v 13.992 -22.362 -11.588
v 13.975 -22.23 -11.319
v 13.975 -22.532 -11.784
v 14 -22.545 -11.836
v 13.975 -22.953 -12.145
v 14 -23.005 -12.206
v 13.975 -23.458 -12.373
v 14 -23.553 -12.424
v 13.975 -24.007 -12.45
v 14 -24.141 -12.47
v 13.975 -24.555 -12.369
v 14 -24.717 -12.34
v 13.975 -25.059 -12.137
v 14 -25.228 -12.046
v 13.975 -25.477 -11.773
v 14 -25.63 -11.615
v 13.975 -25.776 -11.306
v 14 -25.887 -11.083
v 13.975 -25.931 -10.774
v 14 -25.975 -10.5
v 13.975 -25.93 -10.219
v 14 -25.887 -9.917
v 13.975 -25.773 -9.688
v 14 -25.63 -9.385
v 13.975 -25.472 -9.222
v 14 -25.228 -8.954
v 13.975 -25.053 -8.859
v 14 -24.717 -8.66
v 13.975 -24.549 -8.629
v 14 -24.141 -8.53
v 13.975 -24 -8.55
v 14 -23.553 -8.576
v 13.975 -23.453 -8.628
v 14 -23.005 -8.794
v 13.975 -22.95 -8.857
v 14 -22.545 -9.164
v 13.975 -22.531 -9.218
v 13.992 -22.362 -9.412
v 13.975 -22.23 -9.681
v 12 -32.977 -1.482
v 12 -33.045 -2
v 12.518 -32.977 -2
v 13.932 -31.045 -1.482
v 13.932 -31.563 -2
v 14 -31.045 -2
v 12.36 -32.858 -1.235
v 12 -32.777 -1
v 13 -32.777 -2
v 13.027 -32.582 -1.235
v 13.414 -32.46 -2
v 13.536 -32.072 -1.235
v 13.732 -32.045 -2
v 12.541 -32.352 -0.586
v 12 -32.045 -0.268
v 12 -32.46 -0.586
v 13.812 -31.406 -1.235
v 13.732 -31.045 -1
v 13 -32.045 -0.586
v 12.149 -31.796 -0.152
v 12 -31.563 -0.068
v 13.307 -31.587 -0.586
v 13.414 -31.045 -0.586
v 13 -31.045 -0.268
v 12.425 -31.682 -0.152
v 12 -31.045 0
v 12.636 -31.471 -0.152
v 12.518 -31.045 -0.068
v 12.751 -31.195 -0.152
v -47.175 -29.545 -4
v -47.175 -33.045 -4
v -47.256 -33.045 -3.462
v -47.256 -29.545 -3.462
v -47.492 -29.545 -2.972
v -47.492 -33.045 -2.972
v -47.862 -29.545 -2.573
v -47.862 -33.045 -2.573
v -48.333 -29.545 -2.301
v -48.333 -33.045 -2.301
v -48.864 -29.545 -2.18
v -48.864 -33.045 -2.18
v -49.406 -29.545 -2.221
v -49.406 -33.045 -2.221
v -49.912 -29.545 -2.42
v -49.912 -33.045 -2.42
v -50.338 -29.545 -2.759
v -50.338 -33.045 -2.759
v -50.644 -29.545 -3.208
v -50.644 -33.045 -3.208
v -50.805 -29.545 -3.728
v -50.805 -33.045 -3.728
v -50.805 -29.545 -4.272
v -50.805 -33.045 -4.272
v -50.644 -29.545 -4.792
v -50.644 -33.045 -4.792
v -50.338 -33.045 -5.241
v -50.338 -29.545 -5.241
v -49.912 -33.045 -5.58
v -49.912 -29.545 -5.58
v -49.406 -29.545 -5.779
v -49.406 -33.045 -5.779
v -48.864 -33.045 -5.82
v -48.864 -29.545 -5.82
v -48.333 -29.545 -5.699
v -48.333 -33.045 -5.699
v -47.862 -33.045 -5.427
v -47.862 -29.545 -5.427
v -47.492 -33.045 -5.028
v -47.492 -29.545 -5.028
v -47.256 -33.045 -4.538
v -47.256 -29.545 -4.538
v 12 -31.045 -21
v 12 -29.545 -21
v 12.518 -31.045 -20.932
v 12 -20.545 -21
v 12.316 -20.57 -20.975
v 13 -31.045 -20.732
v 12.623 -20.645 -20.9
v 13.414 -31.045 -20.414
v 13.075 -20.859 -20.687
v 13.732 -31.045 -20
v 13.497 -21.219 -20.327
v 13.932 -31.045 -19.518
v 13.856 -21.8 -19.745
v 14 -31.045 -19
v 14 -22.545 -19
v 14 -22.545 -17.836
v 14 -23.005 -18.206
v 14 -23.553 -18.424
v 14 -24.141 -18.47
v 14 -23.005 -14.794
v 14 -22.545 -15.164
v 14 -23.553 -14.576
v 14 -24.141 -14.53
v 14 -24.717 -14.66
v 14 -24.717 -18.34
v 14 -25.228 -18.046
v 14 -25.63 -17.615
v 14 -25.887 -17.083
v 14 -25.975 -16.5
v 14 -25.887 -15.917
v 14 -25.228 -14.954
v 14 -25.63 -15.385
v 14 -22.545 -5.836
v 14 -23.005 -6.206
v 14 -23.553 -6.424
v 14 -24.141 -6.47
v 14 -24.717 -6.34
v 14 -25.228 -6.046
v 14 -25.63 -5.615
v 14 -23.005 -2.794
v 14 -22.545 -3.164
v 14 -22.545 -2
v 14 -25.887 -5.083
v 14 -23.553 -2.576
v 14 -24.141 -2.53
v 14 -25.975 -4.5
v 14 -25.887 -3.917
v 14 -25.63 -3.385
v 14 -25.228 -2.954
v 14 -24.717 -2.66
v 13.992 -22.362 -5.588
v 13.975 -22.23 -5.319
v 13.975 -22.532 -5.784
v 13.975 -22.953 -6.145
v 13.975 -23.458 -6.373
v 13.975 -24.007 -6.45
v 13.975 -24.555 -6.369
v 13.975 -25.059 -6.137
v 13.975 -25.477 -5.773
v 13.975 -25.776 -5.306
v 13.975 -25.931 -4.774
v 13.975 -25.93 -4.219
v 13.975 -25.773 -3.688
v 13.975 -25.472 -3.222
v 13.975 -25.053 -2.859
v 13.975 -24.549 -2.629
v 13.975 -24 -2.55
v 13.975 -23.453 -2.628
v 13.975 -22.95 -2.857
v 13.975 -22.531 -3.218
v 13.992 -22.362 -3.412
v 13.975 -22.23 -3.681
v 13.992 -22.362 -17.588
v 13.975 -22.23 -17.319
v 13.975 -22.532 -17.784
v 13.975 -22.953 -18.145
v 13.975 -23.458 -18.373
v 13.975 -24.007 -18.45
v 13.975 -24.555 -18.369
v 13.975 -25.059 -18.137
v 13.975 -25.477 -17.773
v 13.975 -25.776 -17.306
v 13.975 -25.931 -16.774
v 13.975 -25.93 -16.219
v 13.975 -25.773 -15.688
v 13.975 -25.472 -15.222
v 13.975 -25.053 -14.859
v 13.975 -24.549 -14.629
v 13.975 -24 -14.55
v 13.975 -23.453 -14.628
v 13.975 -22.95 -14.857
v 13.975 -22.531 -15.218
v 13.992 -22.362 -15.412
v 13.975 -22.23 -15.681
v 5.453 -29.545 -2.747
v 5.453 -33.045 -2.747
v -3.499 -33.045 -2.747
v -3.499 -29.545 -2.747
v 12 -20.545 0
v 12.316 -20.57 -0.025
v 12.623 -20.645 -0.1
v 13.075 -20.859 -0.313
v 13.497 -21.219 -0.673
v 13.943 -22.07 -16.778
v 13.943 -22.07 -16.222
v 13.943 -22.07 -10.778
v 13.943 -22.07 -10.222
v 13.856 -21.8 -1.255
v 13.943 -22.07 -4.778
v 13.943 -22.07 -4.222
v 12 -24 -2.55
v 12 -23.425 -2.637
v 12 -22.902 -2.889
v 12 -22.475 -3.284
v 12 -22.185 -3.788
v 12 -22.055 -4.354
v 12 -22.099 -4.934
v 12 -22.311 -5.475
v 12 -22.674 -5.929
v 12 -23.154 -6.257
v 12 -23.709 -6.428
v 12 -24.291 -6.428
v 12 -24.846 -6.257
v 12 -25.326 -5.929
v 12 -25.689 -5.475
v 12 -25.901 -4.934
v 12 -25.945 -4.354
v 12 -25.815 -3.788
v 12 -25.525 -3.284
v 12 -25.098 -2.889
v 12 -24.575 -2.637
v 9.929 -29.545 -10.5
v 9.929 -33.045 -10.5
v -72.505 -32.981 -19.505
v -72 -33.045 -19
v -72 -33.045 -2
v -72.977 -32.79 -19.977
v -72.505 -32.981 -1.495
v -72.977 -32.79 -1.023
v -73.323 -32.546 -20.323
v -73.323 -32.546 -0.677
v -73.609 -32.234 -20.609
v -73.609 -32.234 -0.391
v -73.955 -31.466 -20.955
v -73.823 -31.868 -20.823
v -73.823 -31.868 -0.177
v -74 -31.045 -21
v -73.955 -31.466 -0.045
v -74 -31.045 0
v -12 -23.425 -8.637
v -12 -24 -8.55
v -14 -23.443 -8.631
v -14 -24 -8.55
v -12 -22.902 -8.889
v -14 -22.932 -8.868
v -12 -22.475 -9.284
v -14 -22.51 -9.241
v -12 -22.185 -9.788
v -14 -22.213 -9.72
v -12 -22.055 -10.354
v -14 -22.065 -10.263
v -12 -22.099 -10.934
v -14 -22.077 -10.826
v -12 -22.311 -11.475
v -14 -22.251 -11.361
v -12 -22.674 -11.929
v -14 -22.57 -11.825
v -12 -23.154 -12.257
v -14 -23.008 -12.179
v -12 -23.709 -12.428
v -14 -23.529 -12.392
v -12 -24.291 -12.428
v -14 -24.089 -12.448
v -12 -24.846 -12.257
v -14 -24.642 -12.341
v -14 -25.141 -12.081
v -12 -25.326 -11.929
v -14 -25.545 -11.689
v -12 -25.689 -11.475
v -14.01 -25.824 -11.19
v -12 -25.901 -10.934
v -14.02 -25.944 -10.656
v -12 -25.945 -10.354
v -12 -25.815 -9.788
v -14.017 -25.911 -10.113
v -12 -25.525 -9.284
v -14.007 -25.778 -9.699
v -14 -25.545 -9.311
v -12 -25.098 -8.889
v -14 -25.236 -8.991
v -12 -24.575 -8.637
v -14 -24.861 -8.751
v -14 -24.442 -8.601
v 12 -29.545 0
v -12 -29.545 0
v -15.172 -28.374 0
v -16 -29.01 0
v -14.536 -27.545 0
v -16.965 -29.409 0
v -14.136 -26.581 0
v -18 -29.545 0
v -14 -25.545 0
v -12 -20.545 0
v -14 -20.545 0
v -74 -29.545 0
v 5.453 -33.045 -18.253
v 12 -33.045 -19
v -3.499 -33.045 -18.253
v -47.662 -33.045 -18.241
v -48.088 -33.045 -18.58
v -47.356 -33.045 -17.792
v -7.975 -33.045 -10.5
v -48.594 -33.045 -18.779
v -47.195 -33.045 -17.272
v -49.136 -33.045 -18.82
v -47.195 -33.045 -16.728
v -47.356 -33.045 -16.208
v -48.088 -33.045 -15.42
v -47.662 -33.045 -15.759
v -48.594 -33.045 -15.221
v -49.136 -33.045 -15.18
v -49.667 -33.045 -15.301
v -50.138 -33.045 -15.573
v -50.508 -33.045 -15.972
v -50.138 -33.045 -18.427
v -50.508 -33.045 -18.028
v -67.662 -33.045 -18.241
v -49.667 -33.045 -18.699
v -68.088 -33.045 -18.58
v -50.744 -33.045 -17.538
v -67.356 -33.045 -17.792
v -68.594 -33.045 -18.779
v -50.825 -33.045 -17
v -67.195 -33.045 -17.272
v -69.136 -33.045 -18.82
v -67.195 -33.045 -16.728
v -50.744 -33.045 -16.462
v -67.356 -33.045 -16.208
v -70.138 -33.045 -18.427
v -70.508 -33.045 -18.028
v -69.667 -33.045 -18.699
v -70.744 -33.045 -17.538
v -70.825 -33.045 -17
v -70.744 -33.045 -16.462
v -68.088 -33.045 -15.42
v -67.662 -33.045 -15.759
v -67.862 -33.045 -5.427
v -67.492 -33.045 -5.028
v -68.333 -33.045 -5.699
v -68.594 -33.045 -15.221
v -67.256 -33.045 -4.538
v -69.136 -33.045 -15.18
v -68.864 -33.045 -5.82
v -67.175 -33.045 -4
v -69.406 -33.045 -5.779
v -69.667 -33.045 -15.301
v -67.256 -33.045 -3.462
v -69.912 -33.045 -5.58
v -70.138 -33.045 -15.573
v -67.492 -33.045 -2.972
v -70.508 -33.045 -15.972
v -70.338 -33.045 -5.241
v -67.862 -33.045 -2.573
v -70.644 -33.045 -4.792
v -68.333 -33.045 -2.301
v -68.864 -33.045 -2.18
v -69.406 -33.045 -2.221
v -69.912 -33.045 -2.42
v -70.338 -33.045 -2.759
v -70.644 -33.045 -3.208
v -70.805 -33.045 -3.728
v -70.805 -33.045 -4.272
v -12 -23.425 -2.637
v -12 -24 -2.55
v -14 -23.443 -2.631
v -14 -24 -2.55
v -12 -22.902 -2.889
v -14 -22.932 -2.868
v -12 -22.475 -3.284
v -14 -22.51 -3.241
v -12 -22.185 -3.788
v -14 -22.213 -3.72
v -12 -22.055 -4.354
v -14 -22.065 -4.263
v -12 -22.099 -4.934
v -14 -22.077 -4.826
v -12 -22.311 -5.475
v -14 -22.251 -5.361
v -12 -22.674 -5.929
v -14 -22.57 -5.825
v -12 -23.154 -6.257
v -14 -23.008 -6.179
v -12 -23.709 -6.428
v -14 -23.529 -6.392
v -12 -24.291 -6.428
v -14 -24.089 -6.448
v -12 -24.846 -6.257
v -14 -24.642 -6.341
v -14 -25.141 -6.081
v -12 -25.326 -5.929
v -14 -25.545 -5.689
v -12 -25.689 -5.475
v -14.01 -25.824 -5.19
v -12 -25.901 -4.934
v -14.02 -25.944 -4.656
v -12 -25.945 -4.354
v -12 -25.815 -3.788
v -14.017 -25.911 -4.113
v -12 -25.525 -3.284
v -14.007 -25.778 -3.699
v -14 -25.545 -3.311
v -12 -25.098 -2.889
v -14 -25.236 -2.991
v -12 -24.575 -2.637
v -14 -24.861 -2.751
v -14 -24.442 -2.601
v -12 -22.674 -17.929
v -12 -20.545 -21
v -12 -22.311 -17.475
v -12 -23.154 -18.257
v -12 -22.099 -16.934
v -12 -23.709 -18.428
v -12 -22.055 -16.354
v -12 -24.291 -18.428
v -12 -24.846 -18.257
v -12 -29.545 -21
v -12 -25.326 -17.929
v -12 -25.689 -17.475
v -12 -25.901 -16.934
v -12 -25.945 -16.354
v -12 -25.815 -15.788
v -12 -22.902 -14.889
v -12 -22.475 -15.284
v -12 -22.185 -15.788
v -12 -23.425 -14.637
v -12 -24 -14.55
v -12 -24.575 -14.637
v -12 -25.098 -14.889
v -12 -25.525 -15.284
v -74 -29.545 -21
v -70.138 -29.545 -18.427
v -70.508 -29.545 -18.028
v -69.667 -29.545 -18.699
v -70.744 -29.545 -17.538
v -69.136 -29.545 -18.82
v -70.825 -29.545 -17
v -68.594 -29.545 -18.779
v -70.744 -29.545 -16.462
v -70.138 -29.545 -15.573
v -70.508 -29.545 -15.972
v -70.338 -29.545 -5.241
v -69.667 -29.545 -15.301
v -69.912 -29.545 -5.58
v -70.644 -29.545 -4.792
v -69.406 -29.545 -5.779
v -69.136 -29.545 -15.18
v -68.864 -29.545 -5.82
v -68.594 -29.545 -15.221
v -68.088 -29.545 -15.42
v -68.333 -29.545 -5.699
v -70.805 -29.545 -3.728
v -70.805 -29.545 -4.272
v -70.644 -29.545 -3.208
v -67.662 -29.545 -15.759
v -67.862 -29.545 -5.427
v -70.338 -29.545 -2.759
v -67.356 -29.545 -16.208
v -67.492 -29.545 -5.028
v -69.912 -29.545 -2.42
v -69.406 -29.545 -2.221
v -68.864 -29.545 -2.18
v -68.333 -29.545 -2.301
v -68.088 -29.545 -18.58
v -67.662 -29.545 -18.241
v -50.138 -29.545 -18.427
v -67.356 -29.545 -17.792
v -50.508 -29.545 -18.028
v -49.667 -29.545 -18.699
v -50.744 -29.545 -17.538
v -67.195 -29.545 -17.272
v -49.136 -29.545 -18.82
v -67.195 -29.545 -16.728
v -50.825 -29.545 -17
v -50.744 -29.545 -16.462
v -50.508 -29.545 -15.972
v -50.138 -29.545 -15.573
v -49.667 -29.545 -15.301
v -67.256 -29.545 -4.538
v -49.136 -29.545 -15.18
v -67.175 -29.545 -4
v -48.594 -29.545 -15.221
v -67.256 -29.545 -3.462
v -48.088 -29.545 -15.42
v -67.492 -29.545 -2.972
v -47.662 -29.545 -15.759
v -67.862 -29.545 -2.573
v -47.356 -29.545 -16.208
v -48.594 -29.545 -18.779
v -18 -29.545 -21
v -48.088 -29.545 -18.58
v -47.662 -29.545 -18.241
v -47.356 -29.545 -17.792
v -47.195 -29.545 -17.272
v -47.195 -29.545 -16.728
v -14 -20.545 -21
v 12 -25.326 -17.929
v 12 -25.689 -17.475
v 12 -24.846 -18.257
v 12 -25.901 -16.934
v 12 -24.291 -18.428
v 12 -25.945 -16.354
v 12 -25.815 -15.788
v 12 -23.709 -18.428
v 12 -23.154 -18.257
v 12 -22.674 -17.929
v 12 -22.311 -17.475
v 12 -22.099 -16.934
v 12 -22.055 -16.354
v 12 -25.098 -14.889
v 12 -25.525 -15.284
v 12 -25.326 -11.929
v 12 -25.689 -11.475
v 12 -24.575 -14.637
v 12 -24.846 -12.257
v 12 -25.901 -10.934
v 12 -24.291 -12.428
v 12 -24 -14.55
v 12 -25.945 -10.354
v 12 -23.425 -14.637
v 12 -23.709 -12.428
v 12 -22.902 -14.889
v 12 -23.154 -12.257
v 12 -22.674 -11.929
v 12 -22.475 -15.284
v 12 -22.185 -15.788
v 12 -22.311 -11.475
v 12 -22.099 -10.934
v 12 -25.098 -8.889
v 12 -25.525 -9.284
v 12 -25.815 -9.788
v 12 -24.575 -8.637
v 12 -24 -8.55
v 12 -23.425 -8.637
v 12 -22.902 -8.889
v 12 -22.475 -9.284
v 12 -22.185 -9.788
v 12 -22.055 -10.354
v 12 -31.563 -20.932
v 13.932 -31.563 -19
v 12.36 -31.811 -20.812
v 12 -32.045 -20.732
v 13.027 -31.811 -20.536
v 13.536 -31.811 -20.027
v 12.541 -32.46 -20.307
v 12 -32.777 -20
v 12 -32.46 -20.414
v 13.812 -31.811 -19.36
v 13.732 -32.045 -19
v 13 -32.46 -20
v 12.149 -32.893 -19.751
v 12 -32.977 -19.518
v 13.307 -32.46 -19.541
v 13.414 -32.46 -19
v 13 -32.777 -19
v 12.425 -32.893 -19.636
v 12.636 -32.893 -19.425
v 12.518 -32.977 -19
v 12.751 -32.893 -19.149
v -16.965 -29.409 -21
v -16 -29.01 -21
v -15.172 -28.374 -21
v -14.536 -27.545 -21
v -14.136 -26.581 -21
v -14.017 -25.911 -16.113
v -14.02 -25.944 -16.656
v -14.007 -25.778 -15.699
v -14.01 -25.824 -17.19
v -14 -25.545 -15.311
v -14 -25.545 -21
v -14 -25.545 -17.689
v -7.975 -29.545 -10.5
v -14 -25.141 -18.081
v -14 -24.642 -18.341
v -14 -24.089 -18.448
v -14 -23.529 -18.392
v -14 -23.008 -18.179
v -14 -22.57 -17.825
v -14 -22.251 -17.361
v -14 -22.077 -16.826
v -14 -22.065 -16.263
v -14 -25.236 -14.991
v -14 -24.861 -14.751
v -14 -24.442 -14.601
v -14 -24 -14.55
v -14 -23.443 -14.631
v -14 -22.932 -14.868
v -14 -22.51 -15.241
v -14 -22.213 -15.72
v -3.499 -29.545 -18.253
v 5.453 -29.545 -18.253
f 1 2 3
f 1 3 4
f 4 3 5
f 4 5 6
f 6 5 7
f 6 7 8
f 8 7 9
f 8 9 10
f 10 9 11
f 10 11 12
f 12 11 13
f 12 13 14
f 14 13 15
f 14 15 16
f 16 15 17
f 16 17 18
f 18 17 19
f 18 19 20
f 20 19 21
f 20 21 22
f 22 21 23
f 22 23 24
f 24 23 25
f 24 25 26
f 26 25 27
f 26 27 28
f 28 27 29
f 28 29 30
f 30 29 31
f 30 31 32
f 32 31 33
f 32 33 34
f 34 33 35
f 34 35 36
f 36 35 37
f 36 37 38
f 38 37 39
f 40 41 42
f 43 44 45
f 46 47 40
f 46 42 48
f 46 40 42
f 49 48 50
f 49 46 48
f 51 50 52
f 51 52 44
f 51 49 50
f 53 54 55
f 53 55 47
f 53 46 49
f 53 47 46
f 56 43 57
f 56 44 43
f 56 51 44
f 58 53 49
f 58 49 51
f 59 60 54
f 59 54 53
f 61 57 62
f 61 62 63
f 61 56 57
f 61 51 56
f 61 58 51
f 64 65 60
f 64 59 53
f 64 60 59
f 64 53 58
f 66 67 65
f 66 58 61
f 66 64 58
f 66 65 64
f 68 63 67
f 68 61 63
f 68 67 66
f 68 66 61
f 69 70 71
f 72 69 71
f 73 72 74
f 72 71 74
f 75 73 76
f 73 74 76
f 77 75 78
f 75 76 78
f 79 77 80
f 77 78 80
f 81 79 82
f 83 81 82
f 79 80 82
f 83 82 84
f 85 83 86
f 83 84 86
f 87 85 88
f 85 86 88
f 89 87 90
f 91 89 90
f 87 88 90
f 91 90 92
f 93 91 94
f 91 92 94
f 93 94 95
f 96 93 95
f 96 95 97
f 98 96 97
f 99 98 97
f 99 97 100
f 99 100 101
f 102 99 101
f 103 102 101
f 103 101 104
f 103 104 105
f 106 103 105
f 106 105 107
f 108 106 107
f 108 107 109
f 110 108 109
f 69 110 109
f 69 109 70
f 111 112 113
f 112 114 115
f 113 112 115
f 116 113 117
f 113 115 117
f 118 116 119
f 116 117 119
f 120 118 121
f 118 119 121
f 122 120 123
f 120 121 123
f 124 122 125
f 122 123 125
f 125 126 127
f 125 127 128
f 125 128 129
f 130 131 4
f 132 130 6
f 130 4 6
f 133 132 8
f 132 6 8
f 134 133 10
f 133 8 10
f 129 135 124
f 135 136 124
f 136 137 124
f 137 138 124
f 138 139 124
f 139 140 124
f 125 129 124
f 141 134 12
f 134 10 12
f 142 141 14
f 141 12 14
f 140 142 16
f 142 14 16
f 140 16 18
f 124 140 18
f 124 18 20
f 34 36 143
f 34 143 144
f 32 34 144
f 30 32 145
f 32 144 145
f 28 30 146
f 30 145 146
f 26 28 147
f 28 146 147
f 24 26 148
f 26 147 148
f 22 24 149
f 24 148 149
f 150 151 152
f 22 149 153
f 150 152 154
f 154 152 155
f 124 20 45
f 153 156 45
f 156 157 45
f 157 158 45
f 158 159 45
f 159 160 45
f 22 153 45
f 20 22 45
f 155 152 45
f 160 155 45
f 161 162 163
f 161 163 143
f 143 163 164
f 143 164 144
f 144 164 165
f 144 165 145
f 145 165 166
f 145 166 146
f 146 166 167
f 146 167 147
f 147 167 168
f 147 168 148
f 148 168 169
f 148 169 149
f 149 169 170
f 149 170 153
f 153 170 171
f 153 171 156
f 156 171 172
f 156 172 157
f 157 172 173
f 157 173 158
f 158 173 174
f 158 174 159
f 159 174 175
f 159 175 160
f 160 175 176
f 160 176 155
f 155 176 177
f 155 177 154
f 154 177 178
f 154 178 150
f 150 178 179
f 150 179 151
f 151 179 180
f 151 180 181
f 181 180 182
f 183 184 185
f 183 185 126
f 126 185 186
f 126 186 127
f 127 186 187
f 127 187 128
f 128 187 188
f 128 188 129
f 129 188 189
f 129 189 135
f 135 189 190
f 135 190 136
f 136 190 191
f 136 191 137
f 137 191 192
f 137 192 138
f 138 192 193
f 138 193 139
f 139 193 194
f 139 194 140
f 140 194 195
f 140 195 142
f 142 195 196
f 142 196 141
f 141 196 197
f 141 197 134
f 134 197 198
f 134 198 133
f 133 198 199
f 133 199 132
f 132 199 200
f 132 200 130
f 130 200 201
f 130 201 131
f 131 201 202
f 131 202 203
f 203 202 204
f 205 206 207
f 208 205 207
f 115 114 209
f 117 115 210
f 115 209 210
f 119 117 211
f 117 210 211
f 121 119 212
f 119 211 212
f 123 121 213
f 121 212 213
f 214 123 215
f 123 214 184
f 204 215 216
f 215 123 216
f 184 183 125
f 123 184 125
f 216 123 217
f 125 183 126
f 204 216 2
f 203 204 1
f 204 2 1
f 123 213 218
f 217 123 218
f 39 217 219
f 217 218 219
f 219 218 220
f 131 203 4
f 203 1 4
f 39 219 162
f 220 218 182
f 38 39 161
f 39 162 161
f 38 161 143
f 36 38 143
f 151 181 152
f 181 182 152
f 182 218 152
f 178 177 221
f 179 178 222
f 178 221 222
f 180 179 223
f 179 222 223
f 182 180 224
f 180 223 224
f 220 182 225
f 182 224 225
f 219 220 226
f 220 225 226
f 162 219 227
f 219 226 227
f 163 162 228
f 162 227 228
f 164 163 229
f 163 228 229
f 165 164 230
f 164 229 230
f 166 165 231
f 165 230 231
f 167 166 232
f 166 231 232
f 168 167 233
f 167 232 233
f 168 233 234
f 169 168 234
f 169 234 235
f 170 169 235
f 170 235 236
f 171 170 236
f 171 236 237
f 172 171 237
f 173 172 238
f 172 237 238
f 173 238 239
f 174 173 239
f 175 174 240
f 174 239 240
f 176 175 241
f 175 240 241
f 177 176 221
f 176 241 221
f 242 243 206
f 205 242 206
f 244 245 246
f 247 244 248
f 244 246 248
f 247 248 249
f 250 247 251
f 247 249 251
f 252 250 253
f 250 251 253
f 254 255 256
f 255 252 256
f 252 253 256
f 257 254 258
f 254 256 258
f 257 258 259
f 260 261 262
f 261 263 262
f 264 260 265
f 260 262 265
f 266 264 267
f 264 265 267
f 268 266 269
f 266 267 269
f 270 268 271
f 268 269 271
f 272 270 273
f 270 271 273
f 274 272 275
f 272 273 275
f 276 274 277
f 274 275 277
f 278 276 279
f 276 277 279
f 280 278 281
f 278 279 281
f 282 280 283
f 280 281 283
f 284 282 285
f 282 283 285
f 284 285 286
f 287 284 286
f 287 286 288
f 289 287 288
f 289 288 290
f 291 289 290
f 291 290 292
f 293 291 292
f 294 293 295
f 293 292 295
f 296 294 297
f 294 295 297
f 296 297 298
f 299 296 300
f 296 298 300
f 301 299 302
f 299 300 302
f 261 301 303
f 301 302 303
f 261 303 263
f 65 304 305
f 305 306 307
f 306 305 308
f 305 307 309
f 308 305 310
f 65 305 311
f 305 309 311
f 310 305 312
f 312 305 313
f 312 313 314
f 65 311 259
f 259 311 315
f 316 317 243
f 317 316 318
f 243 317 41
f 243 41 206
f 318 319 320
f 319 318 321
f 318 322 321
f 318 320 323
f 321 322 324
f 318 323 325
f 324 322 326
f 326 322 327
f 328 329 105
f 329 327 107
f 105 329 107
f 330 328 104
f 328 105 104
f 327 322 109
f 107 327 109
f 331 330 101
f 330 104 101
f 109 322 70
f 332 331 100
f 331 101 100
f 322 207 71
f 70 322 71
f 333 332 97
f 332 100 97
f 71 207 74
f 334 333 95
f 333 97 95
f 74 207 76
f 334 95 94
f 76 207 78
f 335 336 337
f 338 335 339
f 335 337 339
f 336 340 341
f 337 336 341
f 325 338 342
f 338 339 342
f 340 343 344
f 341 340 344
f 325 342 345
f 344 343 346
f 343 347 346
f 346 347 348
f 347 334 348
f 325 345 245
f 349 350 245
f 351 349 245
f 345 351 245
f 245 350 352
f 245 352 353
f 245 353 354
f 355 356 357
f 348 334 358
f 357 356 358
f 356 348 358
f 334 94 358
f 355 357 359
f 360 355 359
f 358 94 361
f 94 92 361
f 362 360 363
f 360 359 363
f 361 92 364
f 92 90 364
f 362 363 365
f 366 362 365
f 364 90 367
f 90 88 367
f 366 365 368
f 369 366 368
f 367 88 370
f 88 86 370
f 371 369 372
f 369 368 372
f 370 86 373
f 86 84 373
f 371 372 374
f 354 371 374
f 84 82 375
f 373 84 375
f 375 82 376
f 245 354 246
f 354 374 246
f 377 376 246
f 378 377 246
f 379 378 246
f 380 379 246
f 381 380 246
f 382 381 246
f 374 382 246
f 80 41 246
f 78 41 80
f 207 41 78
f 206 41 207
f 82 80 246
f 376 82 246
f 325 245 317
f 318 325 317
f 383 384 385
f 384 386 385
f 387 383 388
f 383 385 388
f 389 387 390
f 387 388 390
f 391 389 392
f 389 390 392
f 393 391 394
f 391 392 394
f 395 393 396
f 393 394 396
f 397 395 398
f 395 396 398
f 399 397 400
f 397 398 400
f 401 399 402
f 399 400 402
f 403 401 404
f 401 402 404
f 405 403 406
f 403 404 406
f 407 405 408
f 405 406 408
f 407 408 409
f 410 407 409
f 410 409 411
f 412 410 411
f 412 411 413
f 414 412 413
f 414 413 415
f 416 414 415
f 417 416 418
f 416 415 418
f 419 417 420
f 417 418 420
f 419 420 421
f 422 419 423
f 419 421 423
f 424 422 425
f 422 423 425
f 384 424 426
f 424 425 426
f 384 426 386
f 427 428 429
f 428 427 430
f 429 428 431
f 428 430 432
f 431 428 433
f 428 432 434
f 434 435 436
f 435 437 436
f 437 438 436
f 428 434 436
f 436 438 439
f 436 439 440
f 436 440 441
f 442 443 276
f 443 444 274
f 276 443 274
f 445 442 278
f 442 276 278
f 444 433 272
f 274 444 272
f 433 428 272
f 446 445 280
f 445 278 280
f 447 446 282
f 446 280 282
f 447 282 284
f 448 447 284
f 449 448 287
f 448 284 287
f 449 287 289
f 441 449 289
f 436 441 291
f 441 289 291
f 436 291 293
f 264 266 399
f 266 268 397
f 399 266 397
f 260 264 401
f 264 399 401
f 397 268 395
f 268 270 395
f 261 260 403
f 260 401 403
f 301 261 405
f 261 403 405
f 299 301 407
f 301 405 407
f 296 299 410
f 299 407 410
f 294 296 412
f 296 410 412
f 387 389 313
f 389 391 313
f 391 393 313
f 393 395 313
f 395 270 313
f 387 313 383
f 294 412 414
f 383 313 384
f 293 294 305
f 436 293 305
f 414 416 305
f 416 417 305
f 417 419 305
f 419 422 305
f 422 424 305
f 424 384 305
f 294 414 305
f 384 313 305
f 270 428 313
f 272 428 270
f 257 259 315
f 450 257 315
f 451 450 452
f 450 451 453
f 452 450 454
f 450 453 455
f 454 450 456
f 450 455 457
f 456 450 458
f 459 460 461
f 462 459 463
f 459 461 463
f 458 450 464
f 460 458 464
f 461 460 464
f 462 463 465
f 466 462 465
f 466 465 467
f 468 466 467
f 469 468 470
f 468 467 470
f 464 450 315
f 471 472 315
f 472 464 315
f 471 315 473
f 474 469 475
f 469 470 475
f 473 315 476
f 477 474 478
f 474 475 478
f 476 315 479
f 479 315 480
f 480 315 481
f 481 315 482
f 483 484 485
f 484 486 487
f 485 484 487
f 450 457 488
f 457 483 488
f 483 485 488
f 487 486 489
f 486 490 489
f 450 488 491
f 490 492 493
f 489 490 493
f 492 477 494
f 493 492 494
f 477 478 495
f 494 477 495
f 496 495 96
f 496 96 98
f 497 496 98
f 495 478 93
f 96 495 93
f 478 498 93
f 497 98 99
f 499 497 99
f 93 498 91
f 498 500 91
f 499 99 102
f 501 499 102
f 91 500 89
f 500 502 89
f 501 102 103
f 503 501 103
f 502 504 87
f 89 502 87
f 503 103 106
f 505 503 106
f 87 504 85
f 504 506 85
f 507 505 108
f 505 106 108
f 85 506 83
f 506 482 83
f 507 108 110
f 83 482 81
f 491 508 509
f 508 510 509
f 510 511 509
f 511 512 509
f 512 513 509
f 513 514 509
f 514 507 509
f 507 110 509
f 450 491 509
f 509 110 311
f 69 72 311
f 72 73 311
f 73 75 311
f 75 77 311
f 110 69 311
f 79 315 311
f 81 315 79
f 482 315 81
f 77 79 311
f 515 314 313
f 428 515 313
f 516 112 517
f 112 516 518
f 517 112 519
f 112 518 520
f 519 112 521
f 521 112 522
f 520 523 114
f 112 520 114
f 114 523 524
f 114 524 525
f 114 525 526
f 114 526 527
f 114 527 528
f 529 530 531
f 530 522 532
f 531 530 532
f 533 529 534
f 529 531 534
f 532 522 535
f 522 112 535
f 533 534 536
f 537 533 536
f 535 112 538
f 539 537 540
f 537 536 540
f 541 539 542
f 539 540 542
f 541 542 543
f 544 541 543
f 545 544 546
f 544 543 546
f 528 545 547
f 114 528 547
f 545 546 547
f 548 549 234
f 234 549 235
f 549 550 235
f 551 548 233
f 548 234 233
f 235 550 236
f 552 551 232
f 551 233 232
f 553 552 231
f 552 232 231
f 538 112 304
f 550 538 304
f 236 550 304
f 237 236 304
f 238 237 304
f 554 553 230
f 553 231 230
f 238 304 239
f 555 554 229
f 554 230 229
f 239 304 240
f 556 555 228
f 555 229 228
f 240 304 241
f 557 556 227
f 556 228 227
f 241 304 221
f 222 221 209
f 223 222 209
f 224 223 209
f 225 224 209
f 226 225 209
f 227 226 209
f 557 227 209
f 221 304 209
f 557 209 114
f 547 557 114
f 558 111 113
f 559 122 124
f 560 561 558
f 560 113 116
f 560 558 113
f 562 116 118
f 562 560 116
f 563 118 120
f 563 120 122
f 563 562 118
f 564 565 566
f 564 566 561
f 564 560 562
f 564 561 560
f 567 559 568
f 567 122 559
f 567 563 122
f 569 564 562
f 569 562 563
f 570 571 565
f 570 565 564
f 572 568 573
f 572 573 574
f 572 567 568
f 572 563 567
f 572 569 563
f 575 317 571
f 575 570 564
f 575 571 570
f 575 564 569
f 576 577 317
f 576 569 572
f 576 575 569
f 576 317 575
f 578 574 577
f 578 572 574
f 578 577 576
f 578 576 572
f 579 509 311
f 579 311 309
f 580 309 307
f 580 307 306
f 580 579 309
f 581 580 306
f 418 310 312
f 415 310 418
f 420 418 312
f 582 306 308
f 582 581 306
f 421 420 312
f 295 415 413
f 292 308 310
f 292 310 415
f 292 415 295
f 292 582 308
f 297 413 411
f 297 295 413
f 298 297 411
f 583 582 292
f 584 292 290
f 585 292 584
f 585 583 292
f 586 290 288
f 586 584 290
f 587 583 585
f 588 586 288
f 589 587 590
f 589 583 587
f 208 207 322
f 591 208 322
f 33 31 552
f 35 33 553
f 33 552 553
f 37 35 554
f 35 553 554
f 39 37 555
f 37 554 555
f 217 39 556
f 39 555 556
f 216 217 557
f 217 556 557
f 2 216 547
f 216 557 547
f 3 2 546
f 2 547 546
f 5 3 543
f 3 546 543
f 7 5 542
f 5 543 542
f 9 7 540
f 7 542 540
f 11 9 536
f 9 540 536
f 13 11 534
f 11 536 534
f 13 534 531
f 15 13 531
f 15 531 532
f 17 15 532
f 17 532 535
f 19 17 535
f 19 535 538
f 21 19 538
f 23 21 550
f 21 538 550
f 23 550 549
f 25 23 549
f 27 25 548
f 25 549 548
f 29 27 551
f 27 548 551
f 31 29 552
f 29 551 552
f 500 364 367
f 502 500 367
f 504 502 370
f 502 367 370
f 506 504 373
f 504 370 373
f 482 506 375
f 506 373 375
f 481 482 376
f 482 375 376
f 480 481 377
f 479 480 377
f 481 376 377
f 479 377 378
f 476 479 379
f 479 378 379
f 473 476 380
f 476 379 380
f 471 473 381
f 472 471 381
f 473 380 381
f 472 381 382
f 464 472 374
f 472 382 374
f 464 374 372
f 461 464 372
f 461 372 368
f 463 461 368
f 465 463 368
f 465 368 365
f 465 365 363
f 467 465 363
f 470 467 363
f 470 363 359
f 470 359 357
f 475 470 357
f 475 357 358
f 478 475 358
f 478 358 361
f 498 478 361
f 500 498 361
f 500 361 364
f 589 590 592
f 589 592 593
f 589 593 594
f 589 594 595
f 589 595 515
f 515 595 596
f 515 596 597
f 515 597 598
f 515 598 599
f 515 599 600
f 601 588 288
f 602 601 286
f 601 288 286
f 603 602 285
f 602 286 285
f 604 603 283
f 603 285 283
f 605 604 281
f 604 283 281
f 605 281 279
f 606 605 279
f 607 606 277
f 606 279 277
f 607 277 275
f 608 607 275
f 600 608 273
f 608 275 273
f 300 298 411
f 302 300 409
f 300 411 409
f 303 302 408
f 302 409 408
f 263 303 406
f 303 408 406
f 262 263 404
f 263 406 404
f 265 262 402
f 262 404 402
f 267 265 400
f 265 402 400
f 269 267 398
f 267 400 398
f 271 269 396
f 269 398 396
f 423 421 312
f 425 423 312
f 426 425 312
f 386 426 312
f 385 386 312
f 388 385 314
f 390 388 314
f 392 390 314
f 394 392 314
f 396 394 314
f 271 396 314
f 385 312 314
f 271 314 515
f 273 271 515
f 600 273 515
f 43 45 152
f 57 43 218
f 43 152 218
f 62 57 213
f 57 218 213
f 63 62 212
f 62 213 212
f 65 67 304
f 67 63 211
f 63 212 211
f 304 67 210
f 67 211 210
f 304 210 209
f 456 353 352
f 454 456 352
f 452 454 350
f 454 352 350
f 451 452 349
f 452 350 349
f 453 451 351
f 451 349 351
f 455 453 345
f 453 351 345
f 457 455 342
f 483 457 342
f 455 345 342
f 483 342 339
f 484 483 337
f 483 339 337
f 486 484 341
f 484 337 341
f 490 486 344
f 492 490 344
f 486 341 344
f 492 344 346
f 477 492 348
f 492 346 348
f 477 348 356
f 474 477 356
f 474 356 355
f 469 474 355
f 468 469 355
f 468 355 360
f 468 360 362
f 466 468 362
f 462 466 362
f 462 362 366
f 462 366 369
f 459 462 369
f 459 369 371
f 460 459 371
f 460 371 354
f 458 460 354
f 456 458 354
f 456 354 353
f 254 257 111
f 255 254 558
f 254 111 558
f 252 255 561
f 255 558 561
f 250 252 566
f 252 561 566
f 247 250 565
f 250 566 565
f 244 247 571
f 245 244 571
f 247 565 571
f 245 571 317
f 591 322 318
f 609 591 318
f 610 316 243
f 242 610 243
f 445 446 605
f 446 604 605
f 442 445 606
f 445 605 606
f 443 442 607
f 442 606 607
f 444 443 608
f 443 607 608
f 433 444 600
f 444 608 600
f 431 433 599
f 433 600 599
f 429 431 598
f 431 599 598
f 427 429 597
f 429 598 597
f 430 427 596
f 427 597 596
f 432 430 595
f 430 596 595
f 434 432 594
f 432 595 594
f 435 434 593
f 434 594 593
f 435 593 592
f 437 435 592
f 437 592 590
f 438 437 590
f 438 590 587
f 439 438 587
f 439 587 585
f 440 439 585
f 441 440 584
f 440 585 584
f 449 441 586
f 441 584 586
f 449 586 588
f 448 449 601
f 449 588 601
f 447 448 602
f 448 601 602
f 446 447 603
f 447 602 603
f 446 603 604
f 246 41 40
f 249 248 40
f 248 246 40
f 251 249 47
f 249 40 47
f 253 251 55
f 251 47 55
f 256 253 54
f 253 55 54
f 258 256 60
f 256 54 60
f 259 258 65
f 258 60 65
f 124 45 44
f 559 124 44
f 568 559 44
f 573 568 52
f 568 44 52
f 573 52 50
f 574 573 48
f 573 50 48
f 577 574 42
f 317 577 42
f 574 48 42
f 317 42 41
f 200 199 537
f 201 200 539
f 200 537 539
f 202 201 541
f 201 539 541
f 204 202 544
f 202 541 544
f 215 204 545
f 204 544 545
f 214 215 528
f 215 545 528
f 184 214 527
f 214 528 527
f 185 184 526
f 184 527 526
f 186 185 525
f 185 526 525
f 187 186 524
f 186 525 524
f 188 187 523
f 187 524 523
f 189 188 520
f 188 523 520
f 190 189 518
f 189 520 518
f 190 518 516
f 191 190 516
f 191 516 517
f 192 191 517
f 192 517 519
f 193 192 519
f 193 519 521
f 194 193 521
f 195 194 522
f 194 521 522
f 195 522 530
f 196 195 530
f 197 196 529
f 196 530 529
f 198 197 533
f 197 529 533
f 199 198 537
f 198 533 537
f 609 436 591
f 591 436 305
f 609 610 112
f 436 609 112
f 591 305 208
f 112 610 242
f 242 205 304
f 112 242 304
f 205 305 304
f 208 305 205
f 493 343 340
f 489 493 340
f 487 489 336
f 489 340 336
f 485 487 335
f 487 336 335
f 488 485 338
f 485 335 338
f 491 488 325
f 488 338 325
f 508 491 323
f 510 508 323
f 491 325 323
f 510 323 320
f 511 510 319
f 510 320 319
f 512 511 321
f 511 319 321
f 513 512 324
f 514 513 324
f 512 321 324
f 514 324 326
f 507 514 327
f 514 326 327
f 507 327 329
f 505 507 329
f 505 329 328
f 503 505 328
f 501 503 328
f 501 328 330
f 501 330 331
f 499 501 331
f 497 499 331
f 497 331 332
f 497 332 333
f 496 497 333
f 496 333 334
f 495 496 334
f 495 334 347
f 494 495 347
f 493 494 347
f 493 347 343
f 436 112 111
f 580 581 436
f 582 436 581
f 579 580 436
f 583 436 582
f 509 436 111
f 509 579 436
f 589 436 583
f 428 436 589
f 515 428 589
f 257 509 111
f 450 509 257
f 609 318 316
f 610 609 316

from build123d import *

# Parameters (mm, degrees)
BOSS_EXTRUDE1_DEPTH              = 21
FILLET1_R                        = 4
M3_5_CLEARANCE_HOLE1_D           = 3.9
M3_5_CLEARANCE_HOLE1_CSINK_D     = 3.95
M3_5_CLEARANCE_HOLE1_CSINK_ANGLE = 90
SKETCH4_R                        = 1.825
CUT_EXTRUDE1_DEPTH               = 21
FILLET3_R                        = 2


with BuildPart() as part:
    # Sketch1 → Boss-Extrude1 (new body)
    with BuildSketch(Plane.XY):
        Polygon((12, -20.545429918), (14, -20.545429918), (14, -33.045429918), (-74, -33.045429918), (-74, -29.545429918), (-14, -29.545429918), (-14, -20.545429918), (-12, -20.545429918), (-12, -29.545429918), (12, -29.545429918), align=None)
    extrude(amount=-BOSS_EXTRUDE1_DEPTH)

    # Fillet1
    fillet1_edges = [part.edges().sort_by_distance(p)[0] for p in [
        (-14, -29.545429918, -10.5),
    ]]
    fillet(fillet1_edges, radius=FILLET1_R)

    # M3.5 Clearance Hole1 (through all)
    with Locations(Plane(origin=(14, 0, 0), x_dir=(0, 0, -1), z_dir=(1, 0, 0))):
        with Locations((4.5, -24), (10.5, -24), (16.5, -24)):
            CounterSinkHole(M3_5_CLEARANCE_HOLE1_D / 2, M3_5_CLEARANCE_HOLE1_CSINK_D / 2, counter_sink_angle=M3_5_CLEARANCE_HOLE1_CSINK_ANGLE)

    # Sketch4 → Cut-Extrude1 (cut)
    with BuildSketch(Plane.XZ.offset(33.045429918)):
        with Locations((-69, -4)):
            Circle(SKETCH4_R)
        with Locations((-49, -4)):
            Circle(SKETCH4_R)
        with Locations((18.166214484, -42.778432013)):
            Circle(SKETCH4_R)
        with Locations((28.166214484, -60.098940088)):
            Circle(SKETCH4_R)
        with Locations(Location((-69, -17, 0), (0, 0, 180))):
            Circle(SKETCH4_R)
        with Locations(Location((-49, -17, 0), (0, 0, 180))):
            Circle(SKETCH4_R)
        Polygon((-3.49922334, -18.252792933), (5.452930834, -18.252792933), (9.929007921, -10.5), (5.452930834, -2.747207067), (-3.49922334, -2.747207067), (-7.975300427, -10.5), align=None)
    extrude(amount=-CUT_EXTRUDE1_DEPTH, mode=Mode.SUBTRACT)

    # Fillet3
    # the kernel refuses this fillet: 2 mm, written as the material it takes off along each edge
    with BuildSketch(Plane(origin=(12, -31.045429918, -19), x_dir=(0, 0, -1), z_dir=(0, -1, 0))) as fillet3_piece_1_section:
        Polygon((0, 0), (FILLET3_R, 0), (FILLET3_R, FILLET3_R), (0, FILLET3_R), align=None)
    fillet3_piece_1 = extrude(amount=FILLET3_R, mode=Mode.PRIVATE)
    fillet3_piece_1 = fillet3_piece_1 - Plane(origin=(12, -31.045429918, -19), x_dir=(-0.7071067811865475, 0, 0.7071067811865475), z_dir=(0, -1, 0)) * Sphere(FILLET3_R, mode=Mode.PRIVATE)
    add(fillet3_piece_1, mode=Mode.SUBTRACT)
    with BuildSketch(Plane(origin=(12, -31.045429918, -2), x_dir=(0, -1, 0), z_dir=(0, 0, 1))) as fillet3_piece_2_section:
        Polygon((0, 0), (FILLET3_R, 0), (FILLET3_R, FILLET3_R), (0, FILLET3_R), align=None)
    fillet3_piece_2 = extrude(amount=FILLET3_R, mode=Mode.PRIVATE)
    fillet3_piece_2 = fillet3_piece_2 - Plane(origin=(12, -31.045429918, -2), x_dir=(-0.7071067811865476, 0.7071067811865475, 0), z_dir=(0, 0, 1)) * Sphere(FILLET3_R, mode=Mode.PRIVATE)
    add(fillet3_piece_2, mode=Mode.SUBTRACT)
    with BuildSketch(Plane(origin=(-74, -33.045429918, 5), x_dir=(0, 1, 0), z_dir=(0, 0, -1)), Plane(origin=(14, -20.545429918, 5), x_dir=(0, -1, 0), z_dir=(0, 0, -1))) as fillet3_piece_3:
        with BuildLine():
            CenterArc((FILLET3_R, FILLET3_R), FILLET3_R, 180, 90)
            Line((0, FILLET3_R), (0, 0))
            Line((0, 0), (FILLET3_R, 0))
        make_face()
    extrude(amount=31, mode=Mode.SUBTRACT)
    with BuildSketch(Plane(origin=(12, -33.045429918, -21), x_dir=(0, 1, 0), z_dir=(-1, 0, 0))) as fillet3_piece_4:
        with BuildLine():
            CenterArc((FILLET3_R, -FILLET3_R), FILLET3_R, 90, 90)
            Line((0, -FILLET3_R), (0, 0))
            Line((0, 0), (FILLET3_R, 0))
        make_face()
    extrude(amount=91, mode=Mode.SUBTRACT)
    with BuildSketch(Plane(origin=(12, -33.045429918, 0), x_dir=(0, 1, 0), z_dir=(-1, 0, 0))) as fillet3_piece_5:
        with BuildLine():
            CenterArc((FILLET3_R, FILLET3_R), FILLET3_R, 180, 90)
            Line((0, FILLET3_R), (0, 0))
            Line((0, 0), (FILLET3_R, 0))
        make_face()
    extrude(amount=91, mode=Mode.SUBTRACT)
    with BuildSketch(Plane(origin=(14, -15.545429918, -21), x_dir=(-1, 0, 0), z_dir=(0, -1, 0))) as fillet3_piece_6:
        with BuildLine():
            CenterArc((FILLET3_R, -FILLET3_R), FILLET3_R, 90, 90)
            Line((0, -FILLET3_R), (0, 0))
            Line((0, 0), (FILLET3_R, 0))
        make_face()
    extrude(amount=15.5, mode=Mode.SUBTRACT)
    with BuildSketch(Plane(origin=(14, -15.545429918, 0), x_dir=(-1, 0, 0), z_dir=(0, -1, 0))) as fillet3_piece_7:
        with BuildLine():
            CenterArc((FILLET3_R, FILLET3_R), FILLET3_R, 180, 90)
            Line((0, FILLET3_R), (0, 0))
            Line((0, 0), (FILLET3_R, 0))
        make_face()
    extrude(amount=15.5, mode=Mode.SUBTRACT)
    with BuildSketch(Plane(origin=(14, -33.045429918, -2), x_dir=(-1, 0, 0), z_dir=(0, 0, -1))) as fillet3_piece_8:
        with BuildLine():
            CenterArc((FILLET3_R, FILLET3_R), FILLET3_R, 180, 90)
            Line((0, FILLET3_R), (0, 0))
            Line((0, 0), (FILLET3_R, 0))
        make_face()
    extrude(amount=17, mode=Mode.SUBTRACT)


solid = part.part
